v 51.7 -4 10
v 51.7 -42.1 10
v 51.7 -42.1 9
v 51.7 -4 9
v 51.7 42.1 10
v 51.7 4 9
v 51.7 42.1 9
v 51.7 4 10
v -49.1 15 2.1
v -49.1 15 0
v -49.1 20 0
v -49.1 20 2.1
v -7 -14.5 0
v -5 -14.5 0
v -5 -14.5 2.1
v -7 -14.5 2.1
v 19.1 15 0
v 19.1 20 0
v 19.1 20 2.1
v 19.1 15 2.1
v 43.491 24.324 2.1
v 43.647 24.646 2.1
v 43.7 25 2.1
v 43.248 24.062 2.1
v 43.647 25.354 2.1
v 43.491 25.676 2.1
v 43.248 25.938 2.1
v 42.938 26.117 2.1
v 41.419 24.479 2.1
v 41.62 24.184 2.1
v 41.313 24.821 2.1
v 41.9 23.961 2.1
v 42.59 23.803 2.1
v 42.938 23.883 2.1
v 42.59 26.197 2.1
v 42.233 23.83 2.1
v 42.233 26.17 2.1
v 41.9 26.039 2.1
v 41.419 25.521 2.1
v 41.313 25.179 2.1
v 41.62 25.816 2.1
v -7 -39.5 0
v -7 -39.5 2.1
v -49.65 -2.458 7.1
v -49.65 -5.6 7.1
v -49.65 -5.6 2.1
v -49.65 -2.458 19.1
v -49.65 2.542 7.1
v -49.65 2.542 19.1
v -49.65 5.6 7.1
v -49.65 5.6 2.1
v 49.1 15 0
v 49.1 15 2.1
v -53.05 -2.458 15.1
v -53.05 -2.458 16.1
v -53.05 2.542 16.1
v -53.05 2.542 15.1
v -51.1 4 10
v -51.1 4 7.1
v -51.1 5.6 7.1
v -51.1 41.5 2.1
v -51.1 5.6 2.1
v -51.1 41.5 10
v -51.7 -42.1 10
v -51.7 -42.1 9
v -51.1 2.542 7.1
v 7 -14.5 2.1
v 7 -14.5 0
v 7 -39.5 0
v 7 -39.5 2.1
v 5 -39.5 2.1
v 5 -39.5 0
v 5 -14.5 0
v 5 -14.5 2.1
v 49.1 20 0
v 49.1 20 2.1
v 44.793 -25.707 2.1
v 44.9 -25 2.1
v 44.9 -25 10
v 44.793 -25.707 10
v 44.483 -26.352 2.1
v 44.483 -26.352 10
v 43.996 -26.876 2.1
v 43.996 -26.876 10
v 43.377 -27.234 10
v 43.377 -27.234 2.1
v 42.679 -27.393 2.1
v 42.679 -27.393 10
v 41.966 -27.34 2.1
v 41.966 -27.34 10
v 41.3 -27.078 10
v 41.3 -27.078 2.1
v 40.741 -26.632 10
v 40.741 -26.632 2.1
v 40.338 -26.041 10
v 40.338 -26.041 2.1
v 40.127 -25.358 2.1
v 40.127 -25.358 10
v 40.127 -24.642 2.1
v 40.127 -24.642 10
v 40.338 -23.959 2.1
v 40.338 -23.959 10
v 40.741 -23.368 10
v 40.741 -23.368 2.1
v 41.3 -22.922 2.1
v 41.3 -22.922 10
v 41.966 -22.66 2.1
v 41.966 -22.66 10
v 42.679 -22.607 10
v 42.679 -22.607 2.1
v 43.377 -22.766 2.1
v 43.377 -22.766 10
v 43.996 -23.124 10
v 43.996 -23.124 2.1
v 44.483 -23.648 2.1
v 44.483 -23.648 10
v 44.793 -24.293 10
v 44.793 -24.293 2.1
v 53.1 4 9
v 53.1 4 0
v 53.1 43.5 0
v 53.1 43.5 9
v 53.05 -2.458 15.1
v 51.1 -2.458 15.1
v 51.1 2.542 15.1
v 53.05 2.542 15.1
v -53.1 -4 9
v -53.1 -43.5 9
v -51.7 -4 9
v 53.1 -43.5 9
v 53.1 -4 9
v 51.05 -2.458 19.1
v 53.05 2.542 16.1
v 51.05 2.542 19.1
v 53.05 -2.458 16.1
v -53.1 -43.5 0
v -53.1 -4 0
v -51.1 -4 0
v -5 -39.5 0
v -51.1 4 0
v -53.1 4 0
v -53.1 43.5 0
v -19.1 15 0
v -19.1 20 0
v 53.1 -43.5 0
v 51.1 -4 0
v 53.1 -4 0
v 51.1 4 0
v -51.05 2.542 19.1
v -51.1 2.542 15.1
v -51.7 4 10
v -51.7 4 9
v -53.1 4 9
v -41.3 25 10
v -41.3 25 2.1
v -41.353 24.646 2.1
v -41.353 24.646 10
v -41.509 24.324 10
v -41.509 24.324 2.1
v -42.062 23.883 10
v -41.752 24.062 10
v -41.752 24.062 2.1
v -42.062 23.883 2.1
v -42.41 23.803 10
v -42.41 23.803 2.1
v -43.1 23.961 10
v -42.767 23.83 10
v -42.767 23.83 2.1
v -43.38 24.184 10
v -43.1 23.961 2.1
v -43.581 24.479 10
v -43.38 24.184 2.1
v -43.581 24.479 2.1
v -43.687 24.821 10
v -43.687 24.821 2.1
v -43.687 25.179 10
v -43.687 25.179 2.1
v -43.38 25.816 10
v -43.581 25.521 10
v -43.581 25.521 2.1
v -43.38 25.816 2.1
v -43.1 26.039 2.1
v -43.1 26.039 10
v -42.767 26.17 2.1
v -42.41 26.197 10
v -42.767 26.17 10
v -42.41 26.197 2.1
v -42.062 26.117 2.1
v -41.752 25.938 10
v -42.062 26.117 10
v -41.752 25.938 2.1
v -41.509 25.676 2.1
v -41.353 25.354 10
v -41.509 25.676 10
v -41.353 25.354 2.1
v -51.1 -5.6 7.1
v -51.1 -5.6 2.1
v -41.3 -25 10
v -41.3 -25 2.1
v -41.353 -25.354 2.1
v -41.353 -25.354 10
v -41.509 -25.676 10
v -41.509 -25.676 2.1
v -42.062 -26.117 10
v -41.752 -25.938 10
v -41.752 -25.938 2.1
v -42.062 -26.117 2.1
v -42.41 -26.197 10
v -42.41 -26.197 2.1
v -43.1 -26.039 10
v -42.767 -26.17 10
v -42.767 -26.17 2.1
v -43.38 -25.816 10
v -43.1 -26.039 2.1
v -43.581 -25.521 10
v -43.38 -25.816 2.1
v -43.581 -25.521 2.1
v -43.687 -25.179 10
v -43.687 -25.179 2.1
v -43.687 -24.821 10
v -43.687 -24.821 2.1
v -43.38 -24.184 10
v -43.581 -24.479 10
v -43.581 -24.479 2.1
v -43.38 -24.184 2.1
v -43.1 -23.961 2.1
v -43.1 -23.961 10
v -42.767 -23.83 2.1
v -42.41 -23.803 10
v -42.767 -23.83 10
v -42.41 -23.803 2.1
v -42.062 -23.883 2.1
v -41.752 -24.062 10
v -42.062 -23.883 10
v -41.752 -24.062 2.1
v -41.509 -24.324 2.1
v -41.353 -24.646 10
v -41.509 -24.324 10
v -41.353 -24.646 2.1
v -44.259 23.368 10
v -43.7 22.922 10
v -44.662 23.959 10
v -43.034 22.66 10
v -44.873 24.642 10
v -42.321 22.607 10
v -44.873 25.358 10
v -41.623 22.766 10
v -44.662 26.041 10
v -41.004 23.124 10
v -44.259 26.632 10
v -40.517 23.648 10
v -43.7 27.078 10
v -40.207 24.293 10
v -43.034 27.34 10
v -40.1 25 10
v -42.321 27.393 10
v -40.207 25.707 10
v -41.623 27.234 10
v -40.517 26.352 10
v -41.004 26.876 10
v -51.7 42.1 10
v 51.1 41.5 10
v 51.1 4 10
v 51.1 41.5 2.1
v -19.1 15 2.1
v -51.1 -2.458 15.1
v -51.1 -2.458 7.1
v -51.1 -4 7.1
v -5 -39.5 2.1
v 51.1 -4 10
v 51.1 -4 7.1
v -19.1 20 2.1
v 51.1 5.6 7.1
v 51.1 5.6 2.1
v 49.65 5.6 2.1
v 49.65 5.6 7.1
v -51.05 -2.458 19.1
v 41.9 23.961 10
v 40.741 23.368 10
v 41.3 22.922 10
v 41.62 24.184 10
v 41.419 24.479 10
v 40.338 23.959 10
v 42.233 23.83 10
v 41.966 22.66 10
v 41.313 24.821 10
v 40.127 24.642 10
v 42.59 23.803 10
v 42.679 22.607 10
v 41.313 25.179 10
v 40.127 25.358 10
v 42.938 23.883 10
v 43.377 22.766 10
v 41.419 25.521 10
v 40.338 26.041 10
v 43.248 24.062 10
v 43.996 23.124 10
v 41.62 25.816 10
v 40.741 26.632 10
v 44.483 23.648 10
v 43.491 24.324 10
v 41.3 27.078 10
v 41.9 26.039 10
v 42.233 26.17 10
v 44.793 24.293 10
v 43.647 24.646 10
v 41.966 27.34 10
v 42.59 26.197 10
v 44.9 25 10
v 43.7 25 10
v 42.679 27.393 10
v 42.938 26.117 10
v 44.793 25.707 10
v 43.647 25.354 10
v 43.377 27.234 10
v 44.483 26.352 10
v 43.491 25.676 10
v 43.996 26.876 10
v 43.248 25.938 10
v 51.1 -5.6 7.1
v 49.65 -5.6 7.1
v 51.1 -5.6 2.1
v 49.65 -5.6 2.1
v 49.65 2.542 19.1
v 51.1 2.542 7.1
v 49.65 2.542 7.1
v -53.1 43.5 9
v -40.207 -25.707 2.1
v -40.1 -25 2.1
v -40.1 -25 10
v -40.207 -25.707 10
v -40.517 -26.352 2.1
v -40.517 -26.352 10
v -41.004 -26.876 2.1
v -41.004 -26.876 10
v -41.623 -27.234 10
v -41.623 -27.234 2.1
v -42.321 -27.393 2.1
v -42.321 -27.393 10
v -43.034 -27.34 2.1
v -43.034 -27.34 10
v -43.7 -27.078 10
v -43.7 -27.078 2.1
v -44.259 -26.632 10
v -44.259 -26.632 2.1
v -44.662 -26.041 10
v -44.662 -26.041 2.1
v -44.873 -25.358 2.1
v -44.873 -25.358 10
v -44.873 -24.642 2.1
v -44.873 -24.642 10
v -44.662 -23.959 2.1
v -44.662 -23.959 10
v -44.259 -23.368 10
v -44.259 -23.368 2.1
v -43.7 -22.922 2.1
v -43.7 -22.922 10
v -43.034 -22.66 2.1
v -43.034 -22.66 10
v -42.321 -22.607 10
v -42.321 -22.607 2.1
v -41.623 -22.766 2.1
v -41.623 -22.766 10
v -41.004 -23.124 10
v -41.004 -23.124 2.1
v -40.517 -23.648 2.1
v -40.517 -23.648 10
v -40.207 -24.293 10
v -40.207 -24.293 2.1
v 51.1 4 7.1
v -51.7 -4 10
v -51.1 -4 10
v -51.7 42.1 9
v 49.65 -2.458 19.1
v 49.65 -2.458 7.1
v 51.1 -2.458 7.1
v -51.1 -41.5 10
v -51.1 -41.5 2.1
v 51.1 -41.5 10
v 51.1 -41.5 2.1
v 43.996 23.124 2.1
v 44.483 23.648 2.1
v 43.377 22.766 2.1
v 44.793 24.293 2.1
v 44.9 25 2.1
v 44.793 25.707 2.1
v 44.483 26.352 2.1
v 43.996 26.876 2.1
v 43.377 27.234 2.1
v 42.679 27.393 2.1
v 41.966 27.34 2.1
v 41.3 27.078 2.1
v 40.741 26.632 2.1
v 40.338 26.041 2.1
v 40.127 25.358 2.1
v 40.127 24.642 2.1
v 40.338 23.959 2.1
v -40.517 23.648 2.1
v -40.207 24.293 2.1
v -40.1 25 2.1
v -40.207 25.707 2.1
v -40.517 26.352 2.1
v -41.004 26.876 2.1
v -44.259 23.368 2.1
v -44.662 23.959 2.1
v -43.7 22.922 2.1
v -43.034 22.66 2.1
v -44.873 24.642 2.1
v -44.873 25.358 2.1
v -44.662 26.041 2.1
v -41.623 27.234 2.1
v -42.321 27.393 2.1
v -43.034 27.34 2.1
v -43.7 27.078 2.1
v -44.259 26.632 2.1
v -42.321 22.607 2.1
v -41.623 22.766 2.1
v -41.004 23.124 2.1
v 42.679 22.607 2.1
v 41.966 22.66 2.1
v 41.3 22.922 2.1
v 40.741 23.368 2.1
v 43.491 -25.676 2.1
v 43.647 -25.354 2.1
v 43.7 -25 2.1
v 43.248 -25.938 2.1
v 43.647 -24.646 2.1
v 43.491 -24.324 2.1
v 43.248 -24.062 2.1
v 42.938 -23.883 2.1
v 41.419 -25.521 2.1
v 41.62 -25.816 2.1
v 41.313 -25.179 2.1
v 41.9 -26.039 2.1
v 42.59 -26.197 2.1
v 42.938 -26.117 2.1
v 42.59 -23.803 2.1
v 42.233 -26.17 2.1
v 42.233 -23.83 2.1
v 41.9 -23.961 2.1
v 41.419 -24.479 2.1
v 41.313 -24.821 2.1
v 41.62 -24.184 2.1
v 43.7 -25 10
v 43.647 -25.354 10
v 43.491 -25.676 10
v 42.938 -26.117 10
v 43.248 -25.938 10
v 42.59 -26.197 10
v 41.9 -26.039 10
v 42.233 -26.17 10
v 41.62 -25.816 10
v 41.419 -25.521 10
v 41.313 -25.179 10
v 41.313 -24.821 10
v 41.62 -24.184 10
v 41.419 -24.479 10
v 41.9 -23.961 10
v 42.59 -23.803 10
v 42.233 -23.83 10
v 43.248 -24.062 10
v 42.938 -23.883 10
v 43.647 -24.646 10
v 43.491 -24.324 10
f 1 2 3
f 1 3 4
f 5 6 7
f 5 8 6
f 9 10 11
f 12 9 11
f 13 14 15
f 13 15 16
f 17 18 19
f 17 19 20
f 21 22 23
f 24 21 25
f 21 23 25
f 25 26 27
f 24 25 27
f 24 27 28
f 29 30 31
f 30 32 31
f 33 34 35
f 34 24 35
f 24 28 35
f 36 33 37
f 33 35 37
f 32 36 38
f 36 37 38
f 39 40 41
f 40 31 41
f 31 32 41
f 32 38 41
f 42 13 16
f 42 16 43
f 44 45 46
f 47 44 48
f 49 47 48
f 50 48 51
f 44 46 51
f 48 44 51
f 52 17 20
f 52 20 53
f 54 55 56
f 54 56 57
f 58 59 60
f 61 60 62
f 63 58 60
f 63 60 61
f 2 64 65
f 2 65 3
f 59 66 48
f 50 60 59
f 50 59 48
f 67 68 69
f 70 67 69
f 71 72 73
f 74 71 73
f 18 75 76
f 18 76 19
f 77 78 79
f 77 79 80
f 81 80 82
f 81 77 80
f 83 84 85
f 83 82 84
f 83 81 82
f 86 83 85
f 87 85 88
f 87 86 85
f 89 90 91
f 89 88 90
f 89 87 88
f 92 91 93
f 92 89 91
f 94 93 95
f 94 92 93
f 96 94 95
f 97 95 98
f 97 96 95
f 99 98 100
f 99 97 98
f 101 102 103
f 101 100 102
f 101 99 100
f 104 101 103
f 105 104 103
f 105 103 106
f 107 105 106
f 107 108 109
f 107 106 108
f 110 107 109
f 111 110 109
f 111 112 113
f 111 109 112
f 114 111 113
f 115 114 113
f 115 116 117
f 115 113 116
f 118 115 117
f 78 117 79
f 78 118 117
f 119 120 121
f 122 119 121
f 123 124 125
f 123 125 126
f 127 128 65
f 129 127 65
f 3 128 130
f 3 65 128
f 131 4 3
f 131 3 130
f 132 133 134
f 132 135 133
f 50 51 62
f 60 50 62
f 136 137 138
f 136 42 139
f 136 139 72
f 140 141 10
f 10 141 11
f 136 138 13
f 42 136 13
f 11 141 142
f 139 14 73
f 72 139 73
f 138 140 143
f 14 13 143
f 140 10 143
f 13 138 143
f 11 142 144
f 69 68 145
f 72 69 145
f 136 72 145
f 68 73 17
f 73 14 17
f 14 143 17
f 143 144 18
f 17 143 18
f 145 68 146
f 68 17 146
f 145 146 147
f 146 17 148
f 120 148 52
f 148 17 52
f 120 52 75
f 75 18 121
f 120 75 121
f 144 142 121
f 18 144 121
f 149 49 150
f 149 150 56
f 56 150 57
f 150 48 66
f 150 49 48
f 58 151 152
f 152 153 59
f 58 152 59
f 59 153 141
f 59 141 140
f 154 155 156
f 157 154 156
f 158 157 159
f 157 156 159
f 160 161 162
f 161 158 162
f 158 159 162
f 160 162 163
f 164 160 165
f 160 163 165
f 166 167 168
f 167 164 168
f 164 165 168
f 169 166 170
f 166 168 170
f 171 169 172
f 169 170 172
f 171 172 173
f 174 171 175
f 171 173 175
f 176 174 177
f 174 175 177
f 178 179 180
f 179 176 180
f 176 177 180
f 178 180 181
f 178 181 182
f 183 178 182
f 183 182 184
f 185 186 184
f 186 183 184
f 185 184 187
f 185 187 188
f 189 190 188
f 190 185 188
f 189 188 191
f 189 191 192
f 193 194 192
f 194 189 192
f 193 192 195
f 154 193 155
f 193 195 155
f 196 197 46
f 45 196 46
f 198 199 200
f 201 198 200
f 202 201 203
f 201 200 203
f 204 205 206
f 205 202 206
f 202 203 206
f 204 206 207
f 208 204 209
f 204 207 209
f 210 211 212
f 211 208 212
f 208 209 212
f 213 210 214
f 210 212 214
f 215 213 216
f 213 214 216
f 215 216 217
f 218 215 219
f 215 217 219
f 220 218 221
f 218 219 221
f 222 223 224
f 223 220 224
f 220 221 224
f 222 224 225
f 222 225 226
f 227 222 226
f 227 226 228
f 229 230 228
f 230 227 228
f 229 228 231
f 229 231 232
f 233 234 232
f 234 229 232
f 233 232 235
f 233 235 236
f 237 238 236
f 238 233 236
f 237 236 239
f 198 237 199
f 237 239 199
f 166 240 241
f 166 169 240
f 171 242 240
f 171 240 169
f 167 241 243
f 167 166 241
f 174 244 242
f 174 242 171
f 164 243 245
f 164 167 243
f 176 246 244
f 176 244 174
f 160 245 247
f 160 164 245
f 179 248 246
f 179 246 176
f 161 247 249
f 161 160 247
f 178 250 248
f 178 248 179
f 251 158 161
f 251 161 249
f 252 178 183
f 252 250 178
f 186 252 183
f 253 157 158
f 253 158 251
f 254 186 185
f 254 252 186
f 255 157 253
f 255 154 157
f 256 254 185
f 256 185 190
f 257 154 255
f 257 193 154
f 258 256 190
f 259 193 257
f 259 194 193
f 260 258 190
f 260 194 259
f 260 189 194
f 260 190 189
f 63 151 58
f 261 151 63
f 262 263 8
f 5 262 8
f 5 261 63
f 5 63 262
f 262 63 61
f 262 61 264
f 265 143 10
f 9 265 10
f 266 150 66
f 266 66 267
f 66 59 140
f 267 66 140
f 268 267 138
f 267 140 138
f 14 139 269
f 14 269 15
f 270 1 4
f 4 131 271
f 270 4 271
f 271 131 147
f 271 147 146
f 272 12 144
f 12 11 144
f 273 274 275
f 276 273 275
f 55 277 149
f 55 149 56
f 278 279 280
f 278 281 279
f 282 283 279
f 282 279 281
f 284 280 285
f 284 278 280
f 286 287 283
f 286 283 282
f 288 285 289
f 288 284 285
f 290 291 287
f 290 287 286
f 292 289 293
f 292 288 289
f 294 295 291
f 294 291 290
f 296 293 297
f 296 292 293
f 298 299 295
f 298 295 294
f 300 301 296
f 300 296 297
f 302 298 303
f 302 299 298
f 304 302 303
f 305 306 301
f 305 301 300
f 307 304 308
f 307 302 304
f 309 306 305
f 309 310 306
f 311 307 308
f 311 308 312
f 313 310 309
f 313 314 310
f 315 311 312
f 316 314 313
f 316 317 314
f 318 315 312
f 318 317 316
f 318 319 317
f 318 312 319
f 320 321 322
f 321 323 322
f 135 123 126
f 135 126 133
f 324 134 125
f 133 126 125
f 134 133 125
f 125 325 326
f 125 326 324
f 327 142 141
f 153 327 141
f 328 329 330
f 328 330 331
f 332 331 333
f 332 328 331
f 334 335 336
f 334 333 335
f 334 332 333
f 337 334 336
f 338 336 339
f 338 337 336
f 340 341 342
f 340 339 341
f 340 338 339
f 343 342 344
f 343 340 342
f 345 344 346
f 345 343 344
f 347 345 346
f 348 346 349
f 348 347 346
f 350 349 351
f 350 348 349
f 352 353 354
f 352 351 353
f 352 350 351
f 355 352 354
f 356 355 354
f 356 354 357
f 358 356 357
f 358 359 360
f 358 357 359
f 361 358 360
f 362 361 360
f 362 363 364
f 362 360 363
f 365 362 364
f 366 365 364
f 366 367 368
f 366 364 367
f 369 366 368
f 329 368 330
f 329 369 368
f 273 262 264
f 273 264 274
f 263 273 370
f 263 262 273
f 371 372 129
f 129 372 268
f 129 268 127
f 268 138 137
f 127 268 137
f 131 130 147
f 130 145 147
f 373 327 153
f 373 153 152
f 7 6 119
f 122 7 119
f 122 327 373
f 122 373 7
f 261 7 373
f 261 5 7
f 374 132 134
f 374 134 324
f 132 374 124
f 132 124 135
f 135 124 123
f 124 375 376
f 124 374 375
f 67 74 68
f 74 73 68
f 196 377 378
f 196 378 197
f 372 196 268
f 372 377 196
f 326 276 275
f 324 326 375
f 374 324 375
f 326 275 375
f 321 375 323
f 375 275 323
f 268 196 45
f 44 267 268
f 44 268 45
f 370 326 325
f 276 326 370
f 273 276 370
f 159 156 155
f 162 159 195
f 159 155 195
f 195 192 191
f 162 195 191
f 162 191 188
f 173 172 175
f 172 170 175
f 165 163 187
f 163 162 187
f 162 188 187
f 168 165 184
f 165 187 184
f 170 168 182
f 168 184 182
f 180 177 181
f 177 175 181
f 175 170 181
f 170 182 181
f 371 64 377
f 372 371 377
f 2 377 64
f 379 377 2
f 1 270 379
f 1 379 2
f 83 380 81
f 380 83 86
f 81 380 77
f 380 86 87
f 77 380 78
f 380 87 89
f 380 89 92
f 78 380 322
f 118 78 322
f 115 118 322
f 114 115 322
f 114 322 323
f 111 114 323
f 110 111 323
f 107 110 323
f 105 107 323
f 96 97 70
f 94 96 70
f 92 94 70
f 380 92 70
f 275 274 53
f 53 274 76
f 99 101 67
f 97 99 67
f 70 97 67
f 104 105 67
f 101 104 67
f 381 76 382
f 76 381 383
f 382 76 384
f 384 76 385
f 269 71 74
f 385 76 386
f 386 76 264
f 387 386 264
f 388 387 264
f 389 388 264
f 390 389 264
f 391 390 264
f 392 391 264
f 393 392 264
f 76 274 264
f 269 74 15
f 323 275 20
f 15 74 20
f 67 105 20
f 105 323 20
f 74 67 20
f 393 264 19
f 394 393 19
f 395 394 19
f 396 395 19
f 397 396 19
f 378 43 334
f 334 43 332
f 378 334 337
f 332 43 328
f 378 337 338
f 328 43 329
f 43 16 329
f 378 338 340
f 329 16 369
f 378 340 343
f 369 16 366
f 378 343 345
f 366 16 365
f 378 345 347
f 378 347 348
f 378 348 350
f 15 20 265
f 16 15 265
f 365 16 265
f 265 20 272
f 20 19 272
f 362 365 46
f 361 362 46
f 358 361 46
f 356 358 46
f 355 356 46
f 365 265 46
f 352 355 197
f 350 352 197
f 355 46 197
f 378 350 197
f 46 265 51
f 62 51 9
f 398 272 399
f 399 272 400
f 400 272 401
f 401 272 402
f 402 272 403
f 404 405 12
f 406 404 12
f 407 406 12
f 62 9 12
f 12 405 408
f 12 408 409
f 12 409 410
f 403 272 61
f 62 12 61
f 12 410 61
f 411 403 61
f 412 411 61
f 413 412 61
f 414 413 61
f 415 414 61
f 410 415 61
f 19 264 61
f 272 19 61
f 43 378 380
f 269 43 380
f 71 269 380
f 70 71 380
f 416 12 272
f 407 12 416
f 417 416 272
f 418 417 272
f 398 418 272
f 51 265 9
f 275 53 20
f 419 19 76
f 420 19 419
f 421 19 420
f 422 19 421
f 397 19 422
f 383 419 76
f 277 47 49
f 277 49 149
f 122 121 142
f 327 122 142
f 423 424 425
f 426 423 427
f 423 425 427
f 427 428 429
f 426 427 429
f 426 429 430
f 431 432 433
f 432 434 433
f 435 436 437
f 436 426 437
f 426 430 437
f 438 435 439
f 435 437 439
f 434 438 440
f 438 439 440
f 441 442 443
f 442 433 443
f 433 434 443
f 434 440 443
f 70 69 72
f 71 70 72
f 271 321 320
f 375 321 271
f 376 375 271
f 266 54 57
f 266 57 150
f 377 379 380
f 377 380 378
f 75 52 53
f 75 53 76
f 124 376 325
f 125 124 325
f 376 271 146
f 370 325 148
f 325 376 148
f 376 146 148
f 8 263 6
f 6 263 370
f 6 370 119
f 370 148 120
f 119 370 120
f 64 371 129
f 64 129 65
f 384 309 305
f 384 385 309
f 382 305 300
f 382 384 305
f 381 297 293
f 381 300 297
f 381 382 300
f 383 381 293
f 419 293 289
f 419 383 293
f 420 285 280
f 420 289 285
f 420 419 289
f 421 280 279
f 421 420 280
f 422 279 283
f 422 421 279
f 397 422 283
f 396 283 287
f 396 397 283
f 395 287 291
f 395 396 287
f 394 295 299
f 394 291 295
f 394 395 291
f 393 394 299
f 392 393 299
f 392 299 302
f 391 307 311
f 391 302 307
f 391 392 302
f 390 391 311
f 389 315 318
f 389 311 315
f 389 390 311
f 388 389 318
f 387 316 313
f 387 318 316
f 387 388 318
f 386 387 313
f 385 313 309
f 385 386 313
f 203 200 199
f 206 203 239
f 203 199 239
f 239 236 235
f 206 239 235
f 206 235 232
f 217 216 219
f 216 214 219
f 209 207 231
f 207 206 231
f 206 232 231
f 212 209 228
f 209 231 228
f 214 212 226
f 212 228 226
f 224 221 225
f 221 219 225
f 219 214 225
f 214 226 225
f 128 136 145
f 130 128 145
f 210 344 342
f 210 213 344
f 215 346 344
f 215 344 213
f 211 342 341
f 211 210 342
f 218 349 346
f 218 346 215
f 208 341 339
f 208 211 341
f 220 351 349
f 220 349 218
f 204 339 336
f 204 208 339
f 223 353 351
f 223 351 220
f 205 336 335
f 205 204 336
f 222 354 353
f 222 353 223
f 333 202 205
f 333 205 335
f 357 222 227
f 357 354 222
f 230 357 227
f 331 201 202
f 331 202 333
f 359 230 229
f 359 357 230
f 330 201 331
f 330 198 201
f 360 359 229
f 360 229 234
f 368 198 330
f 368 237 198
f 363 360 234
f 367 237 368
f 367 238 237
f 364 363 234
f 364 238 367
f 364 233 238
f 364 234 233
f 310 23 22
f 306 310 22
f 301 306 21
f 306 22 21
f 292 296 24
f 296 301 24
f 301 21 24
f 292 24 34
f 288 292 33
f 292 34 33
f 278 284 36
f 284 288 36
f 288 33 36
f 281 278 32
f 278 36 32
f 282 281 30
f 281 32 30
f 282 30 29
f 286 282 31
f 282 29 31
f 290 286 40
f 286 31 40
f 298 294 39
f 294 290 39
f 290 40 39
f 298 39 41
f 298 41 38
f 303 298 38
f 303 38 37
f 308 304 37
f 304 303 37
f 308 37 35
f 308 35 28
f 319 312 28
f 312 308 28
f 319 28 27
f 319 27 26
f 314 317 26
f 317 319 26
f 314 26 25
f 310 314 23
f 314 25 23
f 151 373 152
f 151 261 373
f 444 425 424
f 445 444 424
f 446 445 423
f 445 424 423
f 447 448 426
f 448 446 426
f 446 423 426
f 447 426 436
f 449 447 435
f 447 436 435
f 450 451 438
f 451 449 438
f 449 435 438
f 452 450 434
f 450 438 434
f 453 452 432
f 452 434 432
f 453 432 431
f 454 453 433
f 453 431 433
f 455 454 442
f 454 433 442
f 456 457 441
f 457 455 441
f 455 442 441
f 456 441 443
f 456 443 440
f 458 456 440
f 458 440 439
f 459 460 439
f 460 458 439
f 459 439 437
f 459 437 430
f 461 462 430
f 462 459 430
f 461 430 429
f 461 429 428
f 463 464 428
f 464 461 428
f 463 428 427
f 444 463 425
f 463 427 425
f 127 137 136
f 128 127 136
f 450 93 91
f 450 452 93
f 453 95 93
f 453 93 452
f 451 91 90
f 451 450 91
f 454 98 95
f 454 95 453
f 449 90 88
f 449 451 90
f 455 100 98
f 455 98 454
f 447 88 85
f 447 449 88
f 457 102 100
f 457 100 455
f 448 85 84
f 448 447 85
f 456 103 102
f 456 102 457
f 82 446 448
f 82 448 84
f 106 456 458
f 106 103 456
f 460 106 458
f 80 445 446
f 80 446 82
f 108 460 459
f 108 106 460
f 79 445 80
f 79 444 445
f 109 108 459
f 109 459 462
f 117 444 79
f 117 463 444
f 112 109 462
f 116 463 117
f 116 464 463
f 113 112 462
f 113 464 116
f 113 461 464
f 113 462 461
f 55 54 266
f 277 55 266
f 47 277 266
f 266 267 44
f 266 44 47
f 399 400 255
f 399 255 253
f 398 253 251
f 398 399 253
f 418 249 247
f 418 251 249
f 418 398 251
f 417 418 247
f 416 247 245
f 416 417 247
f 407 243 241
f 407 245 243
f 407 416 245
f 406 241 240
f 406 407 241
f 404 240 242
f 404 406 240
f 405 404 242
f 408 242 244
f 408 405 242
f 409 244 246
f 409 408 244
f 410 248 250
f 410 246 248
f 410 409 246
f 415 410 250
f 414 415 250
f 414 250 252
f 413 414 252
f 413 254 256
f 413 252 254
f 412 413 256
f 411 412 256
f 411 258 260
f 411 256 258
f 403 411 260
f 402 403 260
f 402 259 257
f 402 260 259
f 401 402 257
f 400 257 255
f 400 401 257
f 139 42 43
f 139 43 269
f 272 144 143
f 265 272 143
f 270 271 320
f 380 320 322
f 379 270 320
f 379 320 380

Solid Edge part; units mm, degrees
sketch "Sketch1" plane through (0, 0, 0) normal (0, 0, 1) x (1, 0, 0)
  line L0 (19.1, 20) -> (19.1, 15)
  line L1 (19.1, 15) -> (49.1, 15)
  line L2 (49.1, 15) -> (49.1, 20)
  line L3 (49.1, 20) -> (19.1, 20)
  line L4 (-7, -39.5) -> (-5, -39.5)
  line L5 (-5, -39.5) -> (-5, -14.5)
  line L6 (-5, -14.5) -> (-7, -14.5)
  line L7 (-7, -14.5) -> (-7, -39.5)
  line L8 (53.1, 43.5) -> (-53.1, 43.5)
  line L9 (-53.1, 43.5) -> (-53.1, -43.5)
  line L10 (-53.1, -43.5) -> (53.1, -43.5)
  line L11 (53.1, -43.5) -> (53.1, 43.5)
  line L12 (7, -39.5) -> (5, -39.5)
  line L13 (5, -39.5) -> (5, -14.5)
  line L14 (5, -14.5) -> (7, -14.5)
  line L15 (7, -14.5) -> (7, -39.5)
  line L16 (-49.1, 20) -> (-19.1, 20)
  line L17 (-19.1, 20) -> (-19.1, 15)
  line L18 (-19.1, 15) -> (-49.1, 15)
  line L19 (-49.1, 15) -> (-49.1, 20)
  dimension "D1" = 87
  dimension "D2" = 106.2
  dimension "D3" = 4
  dimension "D4" = 25
  dimension "D5" = 5
  dimension "D6" = 2
  dimension "D7" = 30
  dimension "D8" = 5
  dimension "D9" = 4
  dimension "D10" = 15
extrude "ExtrudedProtrusion_2" add sketch "Sketch1" along normal blind 10
sketch "Sketch2" plane through (0, 0, 10) normal (0, 0, 1) x (0, 1, 0)
  line L0 (41.5, -51.1) -> (-41.5, -51.1)
  line L1 (-41.5, -51.1) -> (-41.5, 51.1)
  line L2 (-41.5, 51.1) -> (41.5, 51.1)
  line L3 (41.5, 51.1) -> (41.5, -51.1)
  line L4 (-39.5, -7) -> (-39.5, -5)
  line L5 (-39.5, -5) -> (-14.5, -5)
  line L6 (-14.5, -5) -> (-14.5, -7)
  line L7 (-14.5, -7) -> (-39.5, -7)
  line L8 (15, 49.1) -> (20, 49.1)
  line L9 (20, 49.1) -> (20, 19.1)
  line L10 (20, 19.1) -> (15, 19.1)
  line L11 (15, 19.1) -> (15, 49.1)
  line L12 (-14.5, 5) -> (-14.5, 7)
  line L13 (-14.5, 7) -> (-39.5, 7)
  line L14 (-39.5, 7) -> (-39.5, 5)
  line L15 (-39.5, 5) -> (-14.5, 5)
  line L16 (15, -49.1) -> (20, -49.1)
  line L17 (20, -49.1) -> (20, -19.1)
  line L18 (20, -19.1) -> (15, -19.1)
  line L19 (15, -19.1) -> (15, -49.1)
extrude "ExtrudedCutout_1" cut sketch "Sketch2" against normal blind 7.9
sketch "Sketch3" plane through (0, 0, 10) normal (0, 0, 1) x (1, 0, 0)
  line L0 (-51.7, 42.1) -> (-51.7, -42.1)
  line L1 (-51.7, -42.1) -> (51.7, -42.1)
  line L2 (51.7, -42.1) -> (51.7, 42.1)
  line L3 (51.7, 42.1) -> (-51.7, 42.1)
  line L4 (53.1, 43.5) -> (-53.1, 43.5)
  line L5 (-53.1, 43.5) -> (-53.1, -43.5)
  line L6 (-53.1, -43.5) -> (53.1, -43.5)
  line L7 (53.1, -43.5) -> (53.1, 43.5)
  dimension "D1" = 103.4
  dimension "D2" = 84.2
  dimension "D3" = 87
  dimension "D4" = 106.2
extrude "ExtrudedCutout_2" cut sketch "Sketch3" against normal blind 1
sketch "Sketch4" plane through (0, 0, 2.1) normal (0, 0, 1) x (1, 0, 0)
  line L0 (-49.65, -5.6) -> (-49.65, 5.6)
  line L1 (-49.65, 5.6) -> (-51.1, 5.6)
  line L2 (-51.1, 5.6) -> (-51.1, -5.6)
  line L3 (-51.1, -5.6) -> (-49.65, -5.6)
extrude "ExtrudedProtrusion_3" add sketch "Sketch4" along normal blind 5
mirror "Mirror1" about plane through (0, 0, 0) normal (1, 0, 0) of "ExtrudedProtrusion_3"
sketch "Sketch5" plane through (-50.375, 0, 7.1) normal (0, 0, 1) x (0, 1, 0)
  line L0 (-2.4577, -0.725) -> (2.5423, -0.725)
  line L1 (2.5423, -0.725) -> (2.5423, 0.725)
  line L2 (2.5423, 0.725) -> (-2.4577, 0.725)
  line L3 (-2.4577, 0.725) -> (-2.4577, -0.725)
extrude "ExtrudedProtrusion_4" add sketch "Sketch5" along normal blind 8
mirror "Mirror2" about plane through (0, 0, 0) normal (1, 0, 0) of "ExtrudedProtrusion_4"
sketch "Sketch6" plane through (-50.375, -2.4577, 11.1) normal (0, -1, 0) x (0, 0, 1)
  line L0 (4, 2.675) -> (4, -0.725)
  line L1 (4, -0.725) -> (8, -0.725)
  line L2 (8, -0.725) -> (8, 0.675)
  line L3 (8, 0.675) -> (5, 2.675)
  line L4 (5, 2.675) -> (4, 2.675)
extrude "ExtrudedProtrusion_5" add sketch "Sketch6" against normal blind 5
mirror "Mirror3" about plane through (0, 0, 0) normal (1, 0, 0) of "ExtrudedProtrusion_5"
sketch "Sketch7" plane through (0, 0, 0) normal (0, 0, -1) x (0, 1, 0)
  line L0 (-4, 51.1) -> (4, 51.1)
  line L1 (4, 51.1) -> (4, 53.1)
  line L2 (4, 53.1) -> (-4, 53.1)
  line L3 (-4, 53.1) -> (-4, 51.1)
extrude "ExtrudedCutout_4" cut sketch "Sketch7" against normal blind 10
mirror "Mirror4" about plane through (0, 0, 0) normal (1, 0, 0) of "ExtrudedCutout_4"
sketch "Sketch8" plane through (0, 0, 2.1) normal (0, 0, 1) x (1, 0, 0)
  circle A0 centre (42.5, -25) radius 1.2
  circle A1 centre (42.5, -25) radius 2.4
  circle A2 centre (-42.5, -25) radius 2.4
  circle A3 centre (-42.5, -25) radius 1.2
  circle A4 centre (-42.5, 25) radius 1.2
  circle A5 centre (-42.5, 25) radius 2.4
  circle A6 centre (42.5, 25) radius 2.4
  circle A7 centre (42.5, 25) radius 1.2
  dimension "D1" = 42.5
  dimension "D2" = 25
  dimension "D3" = 2.4
extrude "ExtrudedProtrusion_6" add sketch "Sketch8" along normal blind 7.9
